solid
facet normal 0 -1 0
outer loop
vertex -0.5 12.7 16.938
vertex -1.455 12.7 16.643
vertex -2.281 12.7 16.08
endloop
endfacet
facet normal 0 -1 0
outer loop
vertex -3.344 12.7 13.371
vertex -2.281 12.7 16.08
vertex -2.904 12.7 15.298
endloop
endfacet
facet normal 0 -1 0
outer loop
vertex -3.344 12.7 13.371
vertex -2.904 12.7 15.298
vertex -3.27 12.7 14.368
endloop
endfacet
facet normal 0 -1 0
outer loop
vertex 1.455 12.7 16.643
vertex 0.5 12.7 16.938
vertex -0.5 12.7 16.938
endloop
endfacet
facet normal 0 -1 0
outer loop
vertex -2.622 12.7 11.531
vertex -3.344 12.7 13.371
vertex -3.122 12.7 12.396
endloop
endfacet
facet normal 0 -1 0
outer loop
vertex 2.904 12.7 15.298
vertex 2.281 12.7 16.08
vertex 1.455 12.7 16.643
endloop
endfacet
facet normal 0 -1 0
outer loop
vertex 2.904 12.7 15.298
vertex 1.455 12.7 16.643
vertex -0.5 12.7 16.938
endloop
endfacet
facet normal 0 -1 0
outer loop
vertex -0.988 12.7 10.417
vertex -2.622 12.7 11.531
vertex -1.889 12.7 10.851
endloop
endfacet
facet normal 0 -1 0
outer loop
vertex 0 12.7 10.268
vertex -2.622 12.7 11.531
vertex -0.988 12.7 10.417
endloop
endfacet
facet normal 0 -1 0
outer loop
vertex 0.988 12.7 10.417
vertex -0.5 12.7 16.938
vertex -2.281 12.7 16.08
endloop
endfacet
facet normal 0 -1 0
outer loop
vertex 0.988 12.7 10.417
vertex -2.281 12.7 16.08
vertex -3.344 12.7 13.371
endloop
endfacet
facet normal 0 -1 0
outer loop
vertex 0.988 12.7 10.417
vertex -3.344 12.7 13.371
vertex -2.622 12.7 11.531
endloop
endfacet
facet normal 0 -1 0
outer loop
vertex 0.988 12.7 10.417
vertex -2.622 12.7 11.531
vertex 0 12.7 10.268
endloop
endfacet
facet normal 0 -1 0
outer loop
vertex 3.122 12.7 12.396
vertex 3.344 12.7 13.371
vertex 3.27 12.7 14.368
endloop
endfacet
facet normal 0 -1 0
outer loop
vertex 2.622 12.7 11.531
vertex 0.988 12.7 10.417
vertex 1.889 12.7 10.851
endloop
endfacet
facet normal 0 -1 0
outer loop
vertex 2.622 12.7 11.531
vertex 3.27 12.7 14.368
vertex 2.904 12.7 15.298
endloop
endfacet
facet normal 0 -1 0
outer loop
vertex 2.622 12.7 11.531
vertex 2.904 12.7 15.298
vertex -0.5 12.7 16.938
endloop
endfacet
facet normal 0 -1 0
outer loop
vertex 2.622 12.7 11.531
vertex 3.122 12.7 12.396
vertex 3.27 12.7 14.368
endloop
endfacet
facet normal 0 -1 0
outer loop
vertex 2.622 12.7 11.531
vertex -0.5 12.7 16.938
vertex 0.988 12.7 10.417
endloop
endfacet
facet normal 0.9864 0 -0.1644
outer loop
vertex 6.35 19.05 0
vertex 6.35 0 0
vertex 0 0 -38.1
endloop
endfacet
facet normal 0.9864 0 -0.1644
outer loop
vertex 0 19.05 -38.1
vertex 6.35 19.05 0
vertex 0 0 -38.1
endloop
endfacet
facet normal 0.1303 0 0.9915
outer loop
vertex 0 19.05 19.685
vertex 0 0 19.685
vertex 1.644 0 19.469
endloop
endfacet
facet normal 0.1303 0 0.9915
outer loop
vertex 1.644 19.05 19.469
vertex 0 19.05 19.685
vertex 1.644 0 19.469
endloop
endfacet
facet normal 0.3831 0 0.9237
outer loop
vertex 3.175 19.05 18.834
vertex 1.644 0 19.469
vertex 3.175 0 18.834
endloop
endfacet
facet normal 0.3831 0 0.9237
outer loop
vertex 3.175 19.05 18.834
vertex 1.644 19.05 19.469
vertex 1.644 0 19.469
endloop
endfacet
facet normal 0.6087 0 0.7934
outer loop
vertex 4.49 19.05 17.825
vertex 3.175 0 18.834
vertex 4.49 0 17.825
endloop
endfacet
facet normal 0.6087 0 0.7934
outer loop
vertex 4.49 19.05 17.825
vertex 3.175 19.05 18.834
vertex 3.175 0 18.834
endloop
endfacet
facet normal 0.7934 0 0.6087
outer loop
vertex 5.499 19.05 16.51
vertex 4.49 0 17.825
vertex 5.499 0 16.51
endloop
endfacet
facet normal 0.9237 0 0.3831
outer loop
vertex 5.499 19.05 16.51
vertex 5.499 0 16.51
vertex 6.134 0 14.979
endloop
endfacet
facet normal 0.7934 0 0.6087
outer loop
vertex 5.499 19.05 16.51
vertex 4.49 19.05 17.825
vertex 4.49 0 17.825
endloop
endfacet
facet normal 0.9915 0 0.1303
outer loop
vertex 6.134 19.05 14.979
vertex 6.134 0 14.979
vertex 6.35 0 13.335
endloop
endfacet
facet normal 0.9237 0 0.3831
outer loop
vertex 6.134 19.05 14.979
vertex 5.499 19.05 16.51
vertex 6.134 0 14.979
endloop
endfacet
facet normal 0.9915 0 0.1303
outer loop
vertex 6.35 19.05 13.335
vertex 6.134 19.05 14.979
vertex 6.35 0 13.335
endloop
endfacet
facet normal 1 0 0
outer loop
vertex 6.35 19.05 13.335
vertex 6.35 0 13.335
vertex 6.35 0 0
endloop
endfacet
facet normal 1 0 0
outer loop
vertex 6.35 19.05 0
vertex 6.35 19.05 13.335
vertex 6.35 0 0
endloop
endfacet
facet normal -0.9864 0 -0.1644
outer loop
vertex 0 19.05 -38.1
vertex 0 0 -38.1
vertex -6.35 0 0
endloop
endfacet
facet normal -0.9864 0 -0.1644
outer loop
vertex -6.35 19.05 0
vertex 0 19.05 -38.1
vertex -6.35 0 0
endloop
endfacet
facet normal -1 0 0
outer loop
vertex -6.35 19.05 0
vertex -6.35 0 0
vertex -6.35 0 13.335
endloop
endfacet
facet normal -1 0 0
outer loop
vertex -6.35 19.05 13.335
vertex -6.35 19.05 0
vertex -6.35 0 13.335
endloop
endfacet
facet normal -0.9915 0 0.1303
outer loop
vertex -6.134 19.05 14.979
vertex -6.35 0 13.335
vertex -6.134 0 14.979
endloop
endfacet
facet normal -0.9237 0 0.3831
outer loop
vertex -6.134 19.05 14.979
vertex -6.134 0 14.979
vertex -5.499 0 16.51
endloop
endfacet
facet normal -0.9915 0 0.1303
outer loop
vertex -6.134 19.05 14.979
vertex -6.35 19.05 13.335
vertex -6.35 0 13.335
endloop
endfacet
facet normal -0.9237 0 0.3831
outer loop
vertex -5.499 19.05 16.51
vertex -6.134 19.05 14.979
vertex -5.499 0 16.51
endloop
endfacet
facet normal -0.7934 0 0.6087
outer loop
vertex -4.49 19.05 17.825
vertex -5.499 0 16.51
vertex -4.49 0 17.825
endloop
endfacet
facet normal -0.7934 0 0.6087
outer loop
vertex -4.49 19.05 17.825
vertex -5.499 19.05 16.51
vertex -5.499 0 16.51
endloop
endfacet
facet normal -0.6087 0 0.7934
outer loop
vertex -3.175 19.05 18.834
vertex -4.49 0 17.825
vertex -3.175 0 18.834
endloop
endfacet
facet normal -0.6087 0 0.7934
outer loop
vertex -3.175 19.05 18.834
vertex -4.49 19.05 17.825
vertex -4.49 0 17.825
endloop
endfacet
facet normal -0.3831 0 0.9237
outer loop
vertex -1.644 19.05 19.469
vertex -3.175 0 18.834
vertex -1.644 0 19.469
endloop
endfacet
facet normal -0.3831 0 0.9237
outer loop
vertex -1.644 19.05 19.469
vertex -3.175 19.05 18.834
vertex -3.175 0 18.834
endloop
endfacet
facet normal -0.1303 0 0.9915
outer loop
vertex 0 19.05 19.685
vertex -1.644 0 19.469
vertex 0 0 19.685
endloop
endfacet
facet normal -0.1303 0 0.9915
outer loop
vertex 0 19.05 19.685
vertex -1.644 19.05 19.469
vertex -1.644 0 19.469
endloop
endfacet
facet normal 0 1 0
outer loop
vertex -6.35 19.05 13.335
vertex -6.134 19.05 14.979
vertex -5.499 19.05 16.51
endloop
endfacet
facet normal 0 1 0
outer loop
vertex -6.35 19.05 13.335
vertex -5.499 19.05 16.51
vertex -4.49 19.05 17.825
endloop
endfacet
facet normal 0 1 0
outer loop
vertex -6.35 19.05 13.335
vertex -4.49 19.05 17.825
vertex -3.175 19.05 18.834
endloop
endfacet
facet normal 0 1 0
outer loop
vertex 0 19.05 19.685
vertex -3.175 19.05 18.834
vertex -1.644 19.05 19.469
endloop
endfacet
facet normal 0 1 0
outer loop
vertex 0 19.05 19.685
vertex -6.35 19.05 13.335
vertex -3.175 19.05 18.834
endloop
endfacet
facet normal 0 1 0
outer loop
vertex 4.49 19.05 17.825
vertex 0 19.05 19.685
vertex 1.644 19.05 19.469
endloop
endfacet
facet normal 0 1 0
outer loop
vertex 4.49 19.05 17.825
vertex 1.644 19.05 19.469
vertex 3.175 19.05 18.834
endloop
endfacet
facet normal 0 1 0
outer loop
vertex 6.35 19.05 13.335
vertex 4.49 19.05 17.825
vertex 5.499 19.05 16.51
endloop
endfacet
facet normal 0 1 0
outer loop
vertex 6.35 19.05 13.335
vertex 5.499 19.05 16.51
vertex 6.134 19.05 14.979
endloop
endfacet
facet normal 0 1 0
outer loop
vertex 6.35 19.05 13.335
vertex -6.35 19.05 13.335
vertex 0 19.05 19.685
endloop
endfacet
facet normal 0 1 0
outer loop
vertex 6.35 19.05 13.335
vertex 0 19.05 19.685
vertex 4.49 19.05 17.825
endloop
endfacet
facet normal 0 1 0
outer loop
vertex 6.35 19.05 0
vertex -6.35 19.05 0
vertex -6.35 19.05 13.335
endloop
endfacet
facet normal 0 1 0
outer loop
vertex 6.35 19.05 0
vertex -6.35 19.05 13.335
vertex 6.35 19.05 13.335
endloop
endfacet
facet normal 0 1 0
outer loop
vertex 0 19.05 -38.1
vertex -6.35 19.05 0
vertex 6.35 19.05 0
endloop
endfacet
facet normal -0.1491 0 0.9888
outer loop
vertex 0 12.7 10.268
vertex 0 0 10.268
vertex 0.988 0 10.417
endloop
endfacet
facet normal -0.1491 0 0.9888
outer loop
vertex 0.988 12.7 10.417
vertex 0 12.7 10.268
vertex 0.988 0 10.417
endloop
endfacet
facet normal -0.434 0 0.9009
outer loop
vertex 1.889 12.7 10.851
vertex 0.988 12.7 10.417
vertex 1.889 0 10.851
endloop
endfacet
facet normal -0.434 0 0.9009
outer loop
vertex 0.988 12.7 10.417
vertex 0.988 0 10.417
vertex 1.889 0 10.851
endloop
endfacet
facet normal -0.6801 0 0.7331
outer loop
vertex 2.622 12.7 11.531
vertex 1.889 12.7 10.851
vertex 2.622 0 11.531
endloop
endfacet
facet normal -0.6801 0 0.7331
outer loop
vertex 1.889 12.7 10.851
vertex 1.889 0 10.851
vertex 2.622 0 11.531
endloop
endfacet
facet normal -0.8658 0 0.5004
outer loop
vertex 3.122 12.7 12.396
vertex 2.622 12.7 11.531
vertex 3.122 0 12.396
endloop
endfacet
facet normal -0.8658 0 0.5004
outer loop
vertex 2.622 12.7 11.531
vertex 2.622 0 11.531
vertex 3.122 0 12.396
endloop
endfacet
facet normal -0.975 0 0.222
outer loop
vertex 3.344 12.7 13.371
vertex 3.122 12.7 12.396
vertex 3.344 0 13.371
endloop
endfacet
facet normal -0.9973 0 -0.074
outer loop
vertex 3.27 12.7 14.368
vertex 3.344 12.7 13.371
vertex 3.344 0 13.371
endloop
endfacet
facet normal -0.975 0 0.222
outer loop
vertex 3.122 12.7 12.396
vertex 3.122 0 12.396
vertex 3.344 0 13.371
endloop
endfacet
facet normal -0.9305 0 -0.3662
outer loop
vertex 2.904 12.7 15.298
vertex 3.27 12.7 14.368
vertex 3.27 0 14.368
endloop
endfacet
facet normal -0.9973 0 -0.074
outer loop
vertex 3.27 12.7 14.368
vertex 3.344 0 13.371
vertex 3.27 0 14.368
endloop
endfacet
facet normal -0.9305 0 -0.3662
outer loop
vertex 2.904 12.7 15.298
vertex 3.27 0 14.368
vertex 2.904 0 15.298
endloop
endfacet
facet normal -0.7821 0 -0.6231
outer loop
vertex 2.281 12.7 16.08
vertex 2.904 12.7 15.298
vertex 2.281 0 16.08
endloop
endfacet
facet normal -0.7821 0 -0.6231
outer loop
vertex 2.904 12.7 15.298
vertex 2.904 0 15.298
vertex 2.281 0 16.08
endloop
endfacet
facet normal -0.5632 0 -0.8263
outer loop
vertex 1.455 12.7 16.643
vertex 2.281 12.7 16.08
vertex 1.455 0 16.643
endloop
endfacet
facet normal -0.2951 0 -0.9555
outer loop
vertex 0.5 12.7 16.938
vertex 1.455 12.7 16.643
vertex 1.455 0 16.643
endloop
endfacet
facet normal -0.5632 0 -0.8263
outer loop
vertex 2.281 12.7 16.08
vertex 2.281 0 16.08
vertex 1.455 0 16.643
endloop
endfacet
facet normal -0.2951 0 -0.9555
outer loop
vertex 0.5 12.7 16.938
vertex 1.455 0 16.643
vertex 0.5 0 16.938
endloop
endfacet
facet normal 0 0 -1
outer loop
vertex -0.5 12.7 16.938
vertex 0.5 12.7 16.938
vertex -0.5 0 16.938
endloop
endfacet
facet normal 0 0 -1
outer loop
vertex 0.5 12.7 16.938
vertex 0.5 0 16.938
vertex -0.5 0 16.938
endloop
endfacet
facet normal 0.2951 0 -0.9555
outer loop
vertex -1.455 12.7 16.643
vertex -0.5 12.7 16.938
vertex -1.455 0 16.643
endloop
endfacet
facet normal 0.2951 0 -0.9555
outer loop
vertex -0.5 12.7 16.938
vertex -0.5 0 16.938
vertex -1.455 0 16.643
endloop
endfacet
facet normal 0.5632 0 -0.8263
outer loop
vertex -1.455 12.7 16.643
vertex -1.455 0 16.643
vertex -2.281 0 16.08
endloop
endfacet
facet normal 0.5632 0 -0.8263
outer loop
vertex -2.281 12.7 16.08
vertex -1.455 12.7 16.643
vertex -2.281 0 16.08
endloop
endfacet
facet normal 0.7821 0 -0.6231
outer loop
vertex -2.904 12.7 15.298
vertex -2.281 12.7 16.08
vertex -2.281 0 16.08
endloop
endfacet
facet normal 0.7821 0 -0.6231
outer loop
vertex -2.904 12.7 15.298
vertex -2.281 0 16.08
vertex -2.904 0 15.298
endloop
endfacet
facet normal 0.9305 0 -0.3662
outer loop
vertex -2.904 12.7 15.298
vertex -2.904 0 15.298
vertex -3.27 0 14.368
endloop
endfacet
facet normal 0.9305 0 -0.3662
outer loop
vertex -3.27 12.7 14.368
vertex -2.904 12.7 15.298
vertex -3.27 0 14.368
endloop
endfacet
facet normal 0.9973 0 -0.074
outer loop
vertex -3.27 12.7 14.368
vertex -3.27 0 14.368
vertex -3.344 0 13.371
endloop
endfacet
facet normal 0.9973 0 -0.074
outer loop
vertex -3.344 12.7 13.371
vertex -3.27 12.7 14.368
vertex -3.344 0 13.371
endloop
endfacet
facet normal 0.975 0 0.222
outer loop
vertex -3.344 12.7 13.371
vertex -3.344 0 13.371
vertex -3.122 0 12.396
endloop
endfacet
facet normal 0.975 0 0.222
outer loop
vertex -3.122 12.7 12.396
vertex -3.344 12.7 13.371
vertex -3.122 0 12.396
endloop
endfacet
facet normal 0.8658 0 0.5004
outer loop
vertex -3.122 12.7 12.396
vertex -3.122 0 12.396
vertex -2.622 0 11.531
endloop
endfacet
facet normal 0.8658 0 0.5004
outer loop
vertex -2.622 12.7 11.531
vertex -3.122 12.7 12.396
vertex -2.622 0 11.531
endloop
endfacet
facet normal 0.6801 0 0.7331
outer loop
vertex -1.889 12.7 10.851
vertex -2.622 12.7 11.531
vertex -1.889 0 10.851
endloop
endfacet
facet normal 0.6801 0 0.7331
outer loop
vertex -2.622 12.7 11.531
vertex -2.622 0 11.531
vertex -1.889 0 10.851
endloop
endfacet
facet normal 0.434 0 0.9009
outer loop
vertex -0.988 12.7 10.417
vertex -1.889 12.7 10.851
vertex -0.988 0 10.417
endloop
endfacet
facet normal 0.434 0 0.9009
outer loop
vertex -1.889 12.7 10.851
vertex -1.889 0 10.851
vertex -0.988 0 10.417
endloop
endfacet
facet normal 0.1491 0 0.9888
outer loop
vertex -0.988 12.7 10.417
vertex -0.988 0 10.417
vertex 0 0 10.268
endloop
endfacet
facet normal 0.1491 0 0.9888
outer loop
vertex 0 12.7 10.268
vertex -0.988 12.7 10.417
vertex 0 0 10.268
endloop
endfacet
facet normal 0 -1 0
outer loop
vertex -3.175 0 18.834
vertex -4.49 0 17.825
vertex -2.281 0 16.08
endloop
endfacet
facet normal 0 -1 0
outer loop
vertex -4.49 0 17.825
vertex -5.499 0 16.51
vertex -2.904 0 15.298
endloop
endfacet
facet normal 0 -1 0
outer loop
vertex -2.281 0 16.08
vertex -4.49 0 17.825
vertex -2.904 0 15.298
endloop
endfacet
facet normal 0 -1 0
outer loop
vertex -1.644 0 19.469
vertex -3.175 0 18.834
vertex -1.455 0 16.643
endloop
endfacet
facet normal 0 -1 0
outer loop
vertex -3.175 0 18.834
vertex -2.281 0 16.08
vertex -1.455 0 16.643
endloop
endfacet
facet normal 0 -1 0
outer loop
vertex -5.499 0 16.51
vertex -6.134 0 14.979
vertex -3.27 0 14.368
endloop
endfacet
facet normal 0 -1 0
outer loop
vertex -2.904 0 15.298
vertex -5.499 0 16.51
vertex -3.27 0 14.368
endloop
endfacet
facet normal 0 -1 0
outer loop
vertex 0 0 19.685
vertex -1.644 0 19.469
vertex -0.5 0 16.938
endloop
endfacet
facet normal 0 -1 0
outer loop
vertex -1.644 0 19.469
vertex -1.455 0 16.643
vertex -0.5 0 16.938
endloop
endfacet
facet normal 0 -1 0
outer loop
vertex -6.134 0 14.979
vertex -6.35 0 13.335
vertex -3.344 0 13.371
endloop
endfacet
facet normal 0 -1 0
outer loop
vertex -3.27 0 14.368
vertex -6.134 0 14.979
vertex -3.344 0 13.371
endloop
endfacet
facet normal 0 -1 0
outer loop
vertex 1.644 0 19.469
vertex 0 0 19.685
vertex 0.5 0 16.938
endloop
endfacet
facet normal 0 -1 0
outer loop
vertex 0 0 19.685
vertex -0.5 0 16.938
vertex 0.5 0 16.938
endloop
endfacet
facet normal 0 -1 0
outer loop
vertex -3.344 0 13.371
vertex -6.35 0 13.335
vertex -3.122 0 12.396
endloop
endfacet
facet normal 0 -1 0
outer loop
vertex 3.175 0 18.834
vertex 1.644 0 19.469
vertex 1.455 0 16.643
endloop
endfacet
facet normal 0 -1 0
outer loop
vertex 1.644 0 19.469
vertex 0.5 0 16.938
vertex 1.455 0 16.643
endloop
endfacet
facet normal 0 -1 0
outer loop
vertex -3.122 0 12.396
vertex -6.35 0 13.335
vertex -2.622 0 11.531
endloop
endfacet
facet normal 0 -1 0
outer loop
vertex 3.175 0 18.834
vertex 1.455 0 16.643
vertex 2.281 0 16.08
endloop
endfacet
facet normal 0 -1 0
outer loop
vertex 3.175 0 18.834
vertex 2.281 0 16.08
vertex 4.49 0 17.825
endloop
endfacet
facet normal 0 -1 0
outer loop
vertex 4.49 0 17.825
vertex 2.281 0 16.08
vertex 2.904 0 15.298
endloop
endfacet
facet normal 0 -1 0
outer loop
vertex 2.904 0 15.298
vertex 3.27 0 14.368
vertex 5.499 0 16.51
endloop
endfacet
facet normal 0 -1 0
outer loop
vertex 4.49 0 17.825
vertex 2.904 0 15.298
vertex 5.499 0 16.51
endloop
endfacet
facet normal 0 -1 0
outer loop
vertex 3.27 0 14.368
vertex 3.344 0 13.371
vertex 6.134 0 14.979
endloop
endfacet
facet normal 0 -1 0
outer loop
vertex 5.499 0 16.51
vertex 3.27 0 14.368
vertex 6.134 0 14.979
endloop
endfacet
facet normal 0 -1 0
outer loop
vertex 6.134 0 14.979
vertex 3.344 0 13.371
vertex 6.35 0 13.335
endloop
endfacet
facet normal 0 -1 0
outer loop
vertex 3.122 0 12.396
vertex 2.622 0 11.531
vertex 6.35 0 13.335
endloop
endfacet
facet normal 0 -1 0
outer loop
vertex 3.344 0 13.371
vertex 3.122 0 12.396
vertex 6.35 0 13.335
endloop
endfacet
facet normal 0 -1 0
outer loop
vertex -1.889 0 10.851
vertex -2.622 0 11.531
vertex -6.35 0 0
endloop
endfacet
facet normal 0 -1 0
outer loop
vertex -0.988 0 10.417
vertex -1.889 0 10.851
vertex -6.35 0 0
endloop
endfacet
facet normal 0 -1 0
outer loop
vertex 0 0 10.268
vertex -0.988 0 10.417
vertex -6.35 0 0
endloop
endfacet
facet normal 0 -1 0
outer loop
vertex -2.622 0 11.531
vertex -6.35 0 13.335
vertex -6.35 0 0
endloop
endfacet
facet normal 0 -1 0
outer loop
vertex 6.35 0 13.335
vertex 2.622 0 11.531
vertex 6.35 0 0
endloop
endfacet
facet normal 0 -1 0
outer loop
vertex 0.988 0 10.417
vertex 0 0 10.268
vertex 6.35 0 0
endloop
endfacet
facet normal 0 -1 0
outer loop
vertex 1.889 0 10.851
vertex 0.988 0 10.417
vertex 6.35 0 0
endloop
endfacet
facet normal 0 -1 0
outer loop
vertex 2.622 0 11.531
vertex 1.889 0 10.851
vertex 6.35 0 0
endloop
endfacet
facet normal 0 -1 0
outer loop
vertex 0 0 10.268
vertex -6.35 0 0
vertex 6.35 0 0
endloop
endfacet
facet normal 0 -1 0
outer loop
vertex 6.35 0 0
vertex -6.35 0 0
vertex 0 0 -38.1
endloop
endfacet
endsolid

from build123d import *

# Parameters (mm, degrees)
BOSS_EXTRUDE1_DEPTH = 19.05
FILLET1_R           = 6.35
SKETCH3_R           = 3.353621891
CUT_EXTRUDE1_DEPTH  = 12.7


with BuildPart() as part:
    # Sketch1 → Boss-Extrude1 (new body)
    with BuildSketch(Plane(origin=(0, 0, 0), x_dir=(1, 0, 0), z_dir=(0, 1, 0))):
        Polygon((0, 38.1), (-6.35, 0), (-6.35, -19.685), (6.35, -19.685), (6.35, 0), align=None)
    extrude(amount=BOSS_EXTRUDE1_DEPTH)

    # Fillet1
    fillet1_edges = [part.edges().sort_by_distance(p)[0] for p in [
        (-6.35, 9.525, 19.685),
        (6.35, 9.525, 19.685),
    ]]
    fillet(fillet1_edges, radius=FILLET1_R - 0.0001)  # a hair under: the kernel refuses the full size

    # Sketch3 → Cut-Extrude1 (cut)
    with BuildSketch(Plane.XZ):
        with Locations(Location((0, 13.621650325, 0), (0, 0, 270))):
            Circle(SKETCH3_R)
    extrude(amount=-CUT_EXTRUDE1_DEPTH, mode=Mode.SUBTRACT)


solid = part.part
